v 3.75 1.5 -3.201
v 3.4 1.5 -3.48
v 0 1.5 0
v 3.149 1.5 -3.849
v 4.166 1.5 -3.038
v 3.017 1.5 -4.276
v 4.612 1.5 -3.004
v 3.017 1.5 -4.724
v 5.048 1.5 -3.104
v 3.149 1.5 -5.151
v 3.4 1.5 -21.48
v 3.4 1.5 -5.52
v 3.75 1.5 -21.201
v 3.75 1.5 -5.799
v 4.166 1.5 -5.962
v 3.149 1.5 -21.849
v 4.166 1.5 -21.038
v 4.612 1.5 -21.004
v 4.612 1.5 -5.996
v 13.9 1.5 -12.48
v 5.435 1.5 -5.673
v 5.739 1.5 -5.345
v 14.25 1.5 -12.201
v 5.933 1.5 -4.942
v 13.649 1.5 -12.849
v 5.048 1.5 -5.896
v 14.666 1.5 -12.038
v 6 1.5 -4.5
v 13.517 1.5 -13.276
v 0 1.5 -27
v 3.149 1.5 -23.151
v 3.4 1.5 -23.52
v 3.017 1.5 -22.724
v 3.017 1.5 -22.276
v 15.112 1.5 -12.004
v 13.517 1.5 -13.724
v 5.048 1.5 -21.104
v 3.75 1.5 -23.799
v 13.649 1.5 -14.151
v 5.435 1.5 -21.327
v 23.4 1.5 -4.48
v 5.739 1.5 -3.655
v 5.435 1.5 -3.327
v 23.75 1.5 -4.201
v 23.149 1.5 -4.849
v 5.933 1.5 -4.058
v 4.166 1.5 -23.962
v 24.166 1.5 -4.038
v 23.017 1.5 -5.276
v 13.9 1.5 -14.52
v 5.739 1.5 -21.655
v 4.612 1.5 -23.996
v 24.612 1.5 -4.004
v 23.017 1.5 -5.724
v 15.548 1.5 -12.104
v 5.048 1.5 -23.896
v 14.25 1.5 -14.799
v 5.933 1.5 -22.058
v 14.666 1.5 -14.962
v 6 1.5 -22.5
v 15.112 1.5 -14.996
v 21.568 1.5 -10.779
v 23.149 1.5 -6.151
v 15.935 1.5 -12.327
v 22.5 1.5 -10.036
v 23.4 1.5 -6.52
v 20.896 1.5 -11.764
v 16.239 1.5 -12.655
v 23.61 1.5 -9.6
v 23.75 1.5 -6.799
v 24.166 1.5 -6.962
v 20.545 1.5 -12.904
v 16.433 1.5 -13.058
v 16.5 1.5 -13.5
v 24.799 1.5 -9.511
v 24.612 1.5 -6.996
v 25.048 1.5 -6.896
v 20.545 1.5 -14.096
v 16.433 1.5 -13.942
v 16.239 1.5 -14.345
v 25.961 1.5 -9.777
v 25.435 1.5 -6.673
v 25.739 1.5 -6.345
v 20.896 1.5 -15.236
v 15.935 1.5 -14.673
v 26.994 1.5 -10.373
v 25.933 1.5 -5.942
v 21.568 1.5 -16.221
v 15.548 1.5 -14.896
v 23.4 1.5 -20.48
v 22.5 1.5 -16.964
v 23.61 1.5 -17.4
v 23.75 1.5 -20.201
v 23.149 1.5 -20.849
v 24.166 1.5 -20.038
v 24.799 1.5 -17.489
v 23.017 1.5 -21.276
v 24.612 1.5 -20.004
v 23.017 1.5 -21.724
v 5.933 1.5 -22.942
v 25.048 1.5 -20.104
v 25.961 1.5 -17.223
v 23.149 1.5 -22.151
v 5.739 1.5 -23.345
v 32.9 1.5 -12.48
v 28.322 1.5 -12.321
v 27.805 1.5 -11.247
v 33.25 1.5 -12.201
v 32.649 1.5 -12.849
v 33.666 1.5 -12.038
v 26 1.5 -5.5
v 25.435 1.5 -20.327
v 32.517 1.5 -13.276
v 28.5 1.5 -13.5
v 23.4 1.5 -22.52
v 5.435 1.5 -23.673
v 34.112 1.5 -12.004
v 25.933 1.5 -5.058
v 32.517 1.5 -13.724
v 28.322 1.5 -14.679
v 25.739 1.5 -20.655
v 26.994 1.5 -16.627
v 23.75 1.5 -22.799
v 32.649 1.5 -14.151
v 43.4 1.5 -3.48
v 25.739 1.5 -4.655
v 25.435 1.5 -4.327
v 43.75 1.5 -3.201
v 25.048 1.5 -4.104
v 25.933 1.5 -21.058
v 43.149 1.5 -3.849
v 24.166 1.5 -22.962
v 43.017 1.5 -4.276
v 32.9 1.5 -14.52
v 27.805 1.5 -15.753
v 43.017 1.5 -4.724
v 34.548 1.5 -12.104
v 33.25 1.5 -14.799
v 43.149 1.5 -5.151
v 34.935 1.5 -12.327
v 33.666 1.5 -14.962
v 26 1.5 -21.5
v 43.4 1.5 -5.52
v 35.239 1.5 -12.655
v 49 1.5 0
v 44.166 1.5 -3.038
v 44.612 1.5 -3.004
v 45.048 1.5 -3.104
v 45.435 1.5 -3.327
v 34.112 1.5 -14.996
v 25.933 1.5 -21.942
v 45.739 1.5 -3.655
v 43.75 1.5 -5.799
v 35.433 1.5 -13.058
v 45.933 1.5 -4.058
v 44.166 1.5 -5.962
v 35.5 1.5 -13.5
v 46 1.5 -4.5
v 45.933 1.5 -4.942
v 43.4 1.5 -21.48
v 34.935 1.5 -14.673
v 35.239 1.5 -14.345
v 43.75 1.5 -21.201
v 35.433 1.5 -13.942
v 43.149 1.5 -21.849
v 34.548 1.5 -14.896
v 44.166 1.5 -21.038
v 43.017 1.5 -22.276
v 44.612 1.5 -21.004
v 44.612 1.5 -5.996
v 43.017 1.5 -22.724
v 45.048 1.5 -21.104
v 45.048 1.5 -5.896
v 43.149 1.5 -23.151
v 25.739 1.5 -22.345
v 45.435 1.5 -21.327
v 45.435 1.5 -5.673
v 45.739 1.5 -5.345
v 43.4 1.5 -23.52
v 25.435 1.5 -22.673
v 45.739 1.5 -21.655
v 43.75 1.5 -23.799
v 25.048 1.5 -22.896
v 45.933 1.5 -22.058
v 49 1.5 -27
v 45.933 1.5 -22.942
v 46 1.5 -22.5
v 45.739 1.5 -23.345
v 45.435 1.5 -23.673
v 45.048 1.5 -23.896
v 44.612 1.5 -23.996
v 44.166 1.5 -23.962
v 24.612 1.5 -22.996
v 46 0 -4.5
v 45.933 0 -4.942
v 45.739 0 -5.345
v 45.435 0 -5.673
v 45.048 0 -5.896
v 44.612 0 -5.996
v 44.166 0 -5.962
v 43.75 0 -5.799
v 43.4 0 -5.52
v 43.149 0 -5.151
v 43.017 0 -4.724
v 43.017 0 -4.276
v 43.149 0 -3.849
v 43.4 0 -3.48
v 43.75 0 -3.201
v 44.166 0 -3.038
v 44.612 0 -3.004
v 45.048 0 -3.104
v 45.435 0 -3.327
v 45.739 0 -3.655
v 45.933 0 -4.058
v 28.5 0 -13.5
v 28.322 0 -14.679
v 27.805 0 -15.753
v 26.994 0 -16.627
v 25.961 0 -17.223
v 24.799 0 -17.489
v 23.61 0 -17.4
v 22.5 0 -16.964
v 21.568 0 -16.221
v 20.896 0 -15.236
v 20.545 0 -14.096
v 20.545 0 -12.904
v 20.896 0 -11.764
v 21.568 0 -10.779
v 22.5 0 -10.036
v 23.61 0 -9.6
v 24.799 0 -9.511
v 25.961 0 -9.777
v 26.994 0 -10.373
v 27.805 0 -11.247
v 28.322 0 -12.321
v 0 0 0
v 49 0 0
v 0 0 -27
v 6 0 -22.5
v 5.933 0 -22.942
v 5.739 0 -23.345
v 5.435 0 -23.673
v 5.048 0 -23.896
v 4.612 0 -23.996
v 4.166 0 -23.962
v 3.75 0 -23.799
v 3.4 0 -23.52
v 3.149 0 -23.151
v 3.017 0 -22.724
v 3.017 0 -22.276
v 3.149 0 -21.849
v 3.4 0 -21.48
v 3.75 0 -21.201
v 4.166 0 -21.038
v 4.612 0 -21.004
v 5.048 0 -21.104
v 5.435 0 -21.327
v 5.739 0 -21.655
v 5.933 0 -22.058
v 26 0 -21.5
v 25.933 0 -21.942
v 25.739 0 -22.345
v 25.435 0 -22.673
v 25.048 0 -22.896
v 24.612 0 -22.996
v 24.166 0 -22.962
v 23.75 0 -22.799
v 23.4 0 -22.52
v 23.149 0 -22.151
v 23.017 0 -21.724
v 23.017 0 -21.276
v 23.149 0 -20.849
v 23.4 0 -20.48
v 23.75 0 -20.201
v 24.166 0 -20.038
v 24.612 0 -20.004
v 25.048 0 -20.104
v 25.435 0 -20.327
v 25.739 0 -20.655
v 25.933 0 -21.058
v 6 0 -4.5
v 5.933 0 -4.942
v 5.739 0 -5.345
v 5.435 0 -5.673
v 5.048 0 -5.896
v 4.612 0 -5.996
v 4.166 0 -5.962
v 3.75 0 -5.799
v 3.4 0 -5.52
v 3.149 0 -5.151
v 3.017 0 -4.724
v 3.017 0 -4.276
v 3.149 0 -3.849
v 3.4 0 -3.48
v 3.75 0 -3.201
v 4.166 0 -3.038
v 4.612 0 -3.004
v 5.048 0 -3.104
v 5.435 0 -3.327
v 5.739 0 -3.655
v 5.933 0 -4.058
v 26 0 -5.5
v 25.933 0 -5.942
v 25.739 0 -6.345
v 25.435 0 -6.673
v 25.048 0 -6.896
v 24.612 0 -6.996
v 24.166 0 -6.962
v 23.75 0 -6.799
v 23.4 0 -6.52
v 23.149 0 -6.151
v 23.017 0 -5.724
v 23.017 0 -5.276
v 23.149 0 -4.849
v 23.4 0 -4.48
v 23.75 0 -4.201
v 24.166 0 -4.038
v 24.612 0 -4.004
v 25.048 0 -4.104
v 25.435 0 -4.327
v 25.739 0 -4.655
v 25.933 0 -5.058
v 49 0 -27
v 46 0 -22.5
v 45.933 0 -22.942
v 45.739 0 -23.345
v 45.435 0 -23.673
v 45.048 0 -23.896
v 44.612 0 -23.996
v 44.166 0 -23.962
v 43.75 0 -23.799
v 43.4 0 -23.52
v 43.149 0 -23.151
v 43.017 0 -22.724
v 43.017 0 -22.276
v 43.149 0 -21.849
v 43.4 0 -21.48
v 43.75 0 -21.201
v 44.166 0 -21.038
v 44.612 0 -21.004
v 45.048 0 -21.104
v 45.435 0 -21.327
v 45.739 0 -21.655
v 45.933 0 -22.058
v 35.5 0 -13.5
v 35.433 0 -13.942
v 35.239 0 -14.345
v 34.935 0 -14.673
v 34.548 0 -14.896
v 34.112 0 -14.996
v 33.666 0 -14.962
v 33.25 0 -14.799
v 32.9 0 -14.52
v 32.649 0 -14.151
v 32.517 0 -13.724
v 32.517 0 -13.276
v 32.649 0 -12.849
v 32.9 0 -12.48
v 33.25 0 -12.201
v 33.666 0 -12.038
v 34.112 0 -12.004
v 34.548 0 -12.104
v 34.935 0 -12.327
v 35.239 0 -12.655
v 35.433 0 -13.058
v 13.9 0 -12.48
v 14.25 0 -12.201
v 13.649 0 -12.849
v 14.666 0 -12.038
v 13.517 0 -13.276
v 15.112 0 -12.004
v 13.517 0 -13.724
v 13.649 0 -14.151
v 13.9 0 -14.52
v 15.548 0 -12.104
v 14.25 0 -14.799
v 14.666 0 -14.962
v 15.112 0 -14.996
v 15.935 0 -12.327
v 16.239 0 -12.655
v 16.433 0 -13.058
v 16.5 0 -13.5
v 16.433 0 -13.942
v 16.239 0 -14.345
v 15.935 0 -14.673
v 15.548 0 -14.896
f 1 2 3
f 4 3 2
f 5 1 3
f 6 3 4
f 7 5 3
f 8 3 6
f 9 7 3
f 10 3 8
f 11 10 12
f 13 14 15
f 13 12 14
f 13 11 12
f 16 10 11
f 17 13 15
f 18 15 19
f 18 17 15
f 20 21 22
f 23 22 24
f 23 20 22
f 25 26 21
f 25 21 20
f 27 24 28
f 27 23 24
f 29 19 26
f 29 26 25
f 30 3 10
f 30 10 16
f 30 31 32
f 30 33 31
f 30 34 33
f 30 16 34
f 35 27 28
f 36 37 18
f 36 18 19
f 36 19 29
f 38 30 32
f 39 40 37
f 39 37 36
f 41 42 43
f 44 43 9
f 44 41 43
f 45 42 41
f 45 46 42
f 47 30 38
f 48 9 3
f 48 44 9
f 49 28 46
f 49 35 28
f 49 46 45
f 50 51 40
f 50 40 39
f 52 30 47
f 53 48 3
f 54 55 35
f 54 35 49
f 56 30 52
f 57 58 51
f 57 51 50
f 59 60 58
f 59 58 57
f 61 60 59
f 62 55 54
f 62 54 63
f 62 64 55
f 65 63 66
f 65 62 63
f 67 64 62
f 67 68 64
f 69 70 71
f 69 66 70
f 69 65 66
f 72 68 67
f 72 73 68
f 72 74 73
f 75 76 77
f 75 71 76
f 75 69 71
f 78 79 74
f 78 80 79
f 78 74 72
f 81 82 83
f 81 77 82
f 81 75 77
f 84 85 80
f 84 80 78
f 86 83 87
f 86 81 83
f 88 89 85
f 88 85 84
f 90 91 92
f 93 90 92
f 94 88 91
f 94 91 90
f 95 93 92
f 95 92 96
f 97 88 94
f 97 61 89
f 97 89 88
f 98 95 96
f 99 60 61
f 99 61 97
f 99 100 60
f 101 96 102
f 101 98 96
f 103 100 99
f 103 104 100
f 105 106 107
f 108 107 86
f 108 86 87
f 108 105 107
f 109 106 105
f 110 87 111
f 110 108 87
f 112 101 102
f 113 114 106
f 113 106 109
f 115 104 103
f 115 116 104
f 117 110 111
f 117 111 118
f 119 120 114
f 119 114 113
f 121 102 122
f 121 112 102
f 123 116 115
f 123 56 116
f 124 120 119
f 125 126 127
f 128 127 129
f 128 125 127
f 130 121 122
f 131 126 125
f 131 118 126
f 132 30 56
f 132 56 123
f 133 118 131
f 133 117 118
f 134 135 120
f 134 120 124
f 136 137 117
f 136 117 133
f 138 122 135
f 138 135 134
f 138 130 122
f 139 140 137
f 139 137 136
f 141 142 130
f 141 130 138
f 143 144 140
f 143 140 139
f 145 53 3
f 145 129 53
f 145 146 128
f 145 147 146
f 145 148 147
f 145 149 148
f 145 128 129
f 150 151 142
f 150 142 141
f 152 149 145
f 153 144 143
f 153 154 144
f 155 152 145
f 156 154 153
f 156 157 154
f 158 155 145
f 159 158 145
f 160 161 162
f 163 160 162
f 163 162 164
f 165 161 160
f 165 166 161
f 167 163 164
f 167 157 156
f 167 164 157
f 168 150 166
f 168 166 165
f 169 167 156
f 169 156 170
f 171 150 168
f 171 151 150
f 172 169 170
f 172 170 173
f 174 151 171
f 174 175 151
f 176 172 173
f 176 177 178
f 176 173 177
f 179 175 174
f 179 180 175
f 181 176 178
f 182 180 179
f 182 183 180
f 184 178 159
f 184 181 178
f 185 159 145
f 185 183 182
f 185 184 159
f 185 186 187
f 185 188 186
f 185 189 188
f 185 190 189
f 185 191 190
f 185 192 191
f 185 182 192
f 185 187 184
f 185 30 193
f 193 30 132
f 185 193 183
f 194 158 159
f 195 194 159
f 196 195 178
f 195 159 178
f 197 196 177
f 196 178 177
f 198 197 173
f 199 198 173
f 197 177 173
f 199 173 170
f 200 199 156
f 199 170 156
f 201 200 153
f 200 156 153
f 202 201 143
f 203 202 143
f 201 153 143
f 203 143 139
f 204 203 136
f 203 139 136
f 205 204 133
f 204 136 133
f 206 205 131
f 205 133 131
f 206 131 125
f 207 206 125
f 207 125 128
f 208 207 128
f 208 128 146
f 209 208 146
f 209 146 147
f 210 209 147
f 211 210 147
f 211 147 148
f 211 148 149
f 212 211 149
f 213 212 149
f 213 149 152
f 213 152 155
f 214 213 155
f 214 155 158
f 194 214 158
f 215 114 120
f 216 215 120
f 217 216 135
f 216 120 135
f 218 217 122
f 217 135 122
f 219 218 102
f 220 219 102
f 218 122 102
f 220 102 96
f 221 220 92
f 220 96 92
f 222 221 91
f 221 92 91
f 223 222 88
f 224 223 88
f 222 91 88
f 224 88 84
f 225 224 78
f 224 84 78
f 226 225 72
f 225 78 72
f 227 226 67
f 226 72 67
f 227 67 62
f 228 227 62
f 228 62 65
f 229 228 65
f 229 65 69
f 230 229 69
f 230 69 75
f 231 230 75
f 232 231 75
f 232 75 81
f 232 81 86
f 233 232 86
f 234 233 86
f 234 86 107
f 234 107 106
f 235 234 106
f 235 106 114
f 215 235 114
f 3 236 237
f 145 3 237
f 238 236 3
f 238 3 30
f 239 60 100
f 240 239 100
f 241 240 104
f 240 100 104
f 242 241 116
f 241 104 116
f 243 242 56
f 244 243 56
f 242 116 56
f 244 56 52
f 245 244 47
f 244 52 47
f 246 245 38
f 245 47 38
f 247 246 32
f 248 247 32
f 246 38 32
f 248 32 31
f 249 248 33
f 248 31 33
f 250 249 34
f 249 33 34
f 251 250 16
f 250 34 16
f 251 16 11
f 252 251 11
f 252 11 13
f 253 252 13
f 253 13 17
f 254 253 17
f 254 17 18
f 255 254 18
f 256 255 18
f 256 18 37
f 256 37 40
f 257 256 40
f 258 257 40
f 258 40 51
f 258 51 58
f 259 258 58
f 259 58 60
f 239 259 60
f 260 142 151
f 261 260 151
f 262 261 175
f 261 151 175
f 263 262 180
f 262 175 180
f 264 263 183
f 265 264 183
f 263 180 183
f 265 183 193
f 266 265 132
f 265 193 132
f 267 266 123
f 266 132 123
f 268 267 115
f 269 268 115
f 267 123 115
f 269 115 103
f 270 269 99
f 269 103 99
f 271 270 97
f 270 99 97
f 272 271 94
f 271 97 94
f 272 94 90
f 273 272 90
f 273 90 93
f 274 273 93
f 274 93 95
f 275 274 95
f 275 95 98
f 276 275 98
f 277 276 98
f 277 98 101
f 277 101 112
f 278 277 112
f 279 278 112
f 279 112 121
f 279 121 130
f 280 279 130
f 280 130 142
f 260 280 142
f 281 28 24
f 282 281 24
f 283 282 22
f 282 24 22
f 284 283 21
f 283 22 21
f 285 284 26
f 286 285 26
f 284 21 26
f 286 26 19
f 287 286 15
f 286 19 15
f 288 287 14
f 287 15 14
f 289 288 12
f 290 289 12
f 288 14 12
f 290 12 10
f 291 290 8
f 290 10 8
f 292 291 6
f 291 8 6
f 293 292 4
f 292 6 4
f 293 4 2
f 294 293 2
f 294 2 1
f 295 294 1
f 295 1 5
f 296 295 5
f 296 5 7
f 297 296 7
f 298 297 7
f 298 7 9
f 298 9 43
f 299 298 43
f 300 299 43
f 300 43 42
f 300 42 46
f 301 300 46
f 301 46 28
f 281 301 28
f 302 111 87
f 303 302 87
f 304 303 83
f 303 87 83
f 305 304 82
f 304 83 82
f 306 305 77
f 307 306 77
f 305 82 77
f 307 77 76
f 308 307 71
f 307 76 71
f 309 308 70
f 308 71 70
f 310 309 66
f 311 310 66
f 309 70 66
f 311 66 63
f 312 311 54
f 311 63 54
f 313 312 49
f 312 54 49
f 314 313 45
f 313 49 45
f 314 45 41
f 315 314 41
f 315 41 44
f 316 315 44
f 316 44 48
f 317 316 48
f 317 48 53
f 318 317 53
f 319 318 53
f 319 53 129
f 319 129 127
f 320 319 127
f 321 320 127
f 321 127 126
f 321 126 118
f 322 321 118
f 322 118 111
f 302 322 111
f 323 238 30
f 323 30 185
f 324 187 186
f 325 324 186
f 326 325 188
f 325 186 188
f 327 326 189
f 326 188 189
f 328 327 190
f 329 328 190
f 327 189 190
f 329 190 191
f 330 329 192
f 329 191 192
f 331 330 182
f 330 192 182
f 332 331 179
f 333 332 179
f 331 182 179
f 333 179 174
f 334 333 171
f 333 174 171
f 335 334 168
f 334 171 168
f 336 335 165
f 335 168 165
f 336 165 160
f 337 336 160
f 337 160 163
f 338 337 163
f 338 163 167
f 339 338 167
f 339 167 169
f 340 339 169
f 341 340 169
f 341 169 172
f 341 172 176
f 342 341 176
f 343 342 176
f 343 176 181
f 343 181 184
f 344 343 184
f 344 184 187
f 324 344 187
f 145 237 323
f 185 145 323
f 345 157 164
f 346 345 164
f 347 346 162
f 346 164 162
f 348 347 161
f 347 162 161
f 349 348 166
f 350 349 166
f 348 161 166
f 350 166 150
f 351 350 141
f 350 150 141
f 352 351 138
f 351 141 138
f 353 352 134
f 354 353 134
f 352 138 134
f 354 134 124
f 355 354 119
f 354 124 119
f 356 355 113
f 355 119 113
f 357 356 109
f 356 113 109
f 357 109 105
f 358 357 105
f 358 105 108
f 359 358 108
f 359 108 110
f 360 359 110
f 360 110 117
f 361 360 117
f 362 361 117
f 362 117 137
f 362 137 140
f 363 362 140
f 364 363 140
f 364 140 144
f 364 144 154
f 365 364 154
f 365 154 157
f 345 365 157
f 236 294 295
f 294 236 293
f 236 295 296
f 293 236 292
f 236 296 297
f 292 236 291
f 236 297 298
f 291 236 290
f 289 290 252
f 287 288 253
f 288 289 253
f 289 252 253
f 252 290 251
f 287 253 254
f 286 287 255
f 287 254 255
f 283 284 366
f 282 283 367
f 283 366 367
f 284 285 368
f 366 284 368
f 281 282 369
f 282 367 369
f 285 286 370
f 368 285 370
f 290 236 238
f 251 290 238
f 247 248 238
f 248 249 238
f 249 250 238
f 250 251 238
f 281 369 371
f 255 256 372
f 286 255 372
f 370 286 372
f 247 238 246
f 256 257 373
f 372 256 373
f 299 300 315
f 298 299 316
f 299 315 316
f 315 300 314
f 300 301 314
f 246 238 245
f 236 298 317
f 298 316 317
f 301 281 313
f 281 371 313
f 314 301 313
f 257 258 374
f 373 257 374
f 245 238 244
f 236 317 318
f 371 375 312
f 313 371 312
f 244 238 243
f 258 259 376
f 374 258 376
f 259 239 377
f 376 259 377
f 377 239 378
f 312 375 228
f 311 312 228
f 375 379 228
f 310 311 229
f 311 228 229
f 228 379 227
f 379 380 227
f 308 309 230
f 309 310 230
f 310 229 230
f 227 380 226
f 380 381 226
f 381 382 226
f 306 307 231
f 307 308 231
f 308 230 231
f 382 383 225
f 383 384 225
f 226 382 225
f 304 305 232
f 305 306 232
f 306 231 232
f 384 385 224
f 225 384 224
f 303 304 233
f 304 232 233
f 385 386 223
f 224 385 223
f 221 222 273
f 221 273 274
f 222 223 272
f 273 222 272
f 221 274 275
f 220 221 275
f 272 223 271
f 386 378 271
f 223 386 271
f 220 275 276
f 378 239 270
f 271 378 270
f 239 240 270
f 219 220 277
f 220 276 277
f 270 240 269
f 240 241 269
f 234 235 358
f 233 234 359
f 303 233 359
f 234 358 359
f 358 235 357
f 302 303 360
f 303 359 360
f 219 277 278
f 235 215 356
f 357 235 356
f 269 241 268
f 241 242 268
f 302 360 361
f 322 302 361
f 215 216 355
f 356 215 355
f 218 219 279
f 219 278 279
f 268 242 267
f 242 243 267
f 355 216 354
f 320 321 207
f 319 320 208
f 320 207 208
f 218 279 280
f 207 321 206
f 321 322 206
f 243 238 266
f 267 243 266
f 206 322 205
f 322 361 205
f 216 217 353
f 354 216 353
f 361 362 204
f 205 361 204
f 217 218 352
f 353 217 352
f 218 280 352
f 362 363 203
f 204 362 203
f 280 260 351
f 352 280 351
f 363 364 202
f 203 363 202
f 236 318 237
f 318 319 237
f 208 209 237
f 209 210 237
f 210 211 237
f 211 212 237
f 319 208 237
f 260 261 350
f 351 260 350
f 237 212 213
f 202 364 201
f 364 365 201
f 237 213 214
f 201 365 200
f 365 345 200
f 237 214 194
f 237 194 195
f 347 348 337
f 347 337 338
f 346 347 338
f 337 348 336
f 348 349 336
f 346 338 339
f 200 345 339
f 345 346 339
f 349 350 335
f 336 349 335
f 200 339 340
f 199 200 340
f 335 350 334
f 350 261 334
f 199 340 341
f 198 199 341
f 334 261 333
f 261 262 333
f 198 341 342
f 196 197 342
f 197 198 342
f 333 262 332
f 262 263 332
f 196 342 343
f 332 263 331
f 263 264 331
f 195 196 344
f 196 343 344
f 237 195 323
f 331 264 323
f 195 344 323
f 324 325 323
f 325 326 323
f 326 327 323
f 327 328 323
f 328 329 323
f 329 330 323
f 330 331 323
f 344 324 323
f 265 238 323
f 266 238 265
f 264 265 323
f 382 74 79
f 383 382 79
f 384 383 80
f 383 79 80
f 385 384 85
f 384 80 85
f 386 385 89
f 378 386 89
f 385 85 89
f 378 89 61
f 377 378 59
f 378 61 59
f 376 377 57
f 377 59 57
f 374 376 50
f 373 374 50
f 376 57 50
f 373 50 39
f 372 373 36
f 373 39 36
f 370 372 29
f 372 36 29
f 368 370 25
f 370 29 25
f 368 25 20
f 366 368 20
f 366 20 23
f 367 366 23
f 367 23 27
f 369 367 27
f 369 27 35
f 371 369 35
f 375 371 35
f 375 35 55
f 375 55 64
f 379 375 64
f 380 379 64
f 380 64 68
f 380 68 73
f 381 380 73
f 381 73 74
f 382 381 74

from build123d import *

# Parameters (mm, degrees)
SKETCH1_W               = 49
SKETCH1_H               = 27
BOSS_EXTRUDE1_DEPTH     = 1.5
CUT_EXTRUDE1_DEPTH      = 10
CUT_EXTRUDE1_DEPTH_BACK = 10
SKETCH2_R               = 1.5
CUT_EXTRUDE2_DEPTH      = 10
CUT_EXTRUDE2_DEPTH_BACK = 10
SKETCH3_R               = 1.5
SKETCH3_R_2             = 4


with BuildPart() as part:
    # Sketch1 → Boss-Extrude1 (new body)
    with BuildSketch(Plane(origin=(0, 0, 0), x_dir=(1, 0, 0), z_dir=(0, 1, 0))):
        with Locations((24.5, 13.5)):
            Rectangle(SKETCH1_W, SKETCH1_H)
    extrude(amount=BOSS_EXTRUDE1_DEPTH)

    # Sketch2 → Cut-Extrude1 (cut, two sides: drawn at the far end of the back side and taken through both)
    with BuildSketch(Plane(origin=(0, 1.5, 0), x_dir=(1, 0, 0), z_dir=(0, 1, 0)).offset(-CUT_EXTRUDE1_DEPTH_BACK)):
        with Locations((4.5, 22.5)):
            Circle(SKETCH2_R)
        with Locations((4.5, 4.5)):
            Circle(SKETCH2_R)
        with Locations((44.5, 4.5)):
            Circle(SKETCH2_R)
        with Locations((44.5, 22.5)):
            Circle(SKETCH2_R)
    extrude(amount=CUT_EXTRUDE1_DEPTH + CUT_EXTRUDE1_DEPTH_BACK, mode=Mode.SUBTRACT)

    # Sketch3 → Cut-Extrude2 (cut, two sides: drawn at the far end of the back side and taken through both)
    with BuildSketch(Plane(origin=(0, 1.5, 0), x_dir=(1, 0, 0), z_dir=(0, 1, 0)).offset(-CUT_EXTRUDE2_DEPTH_BACK)):
        with Locations((15, 13.5)):
            Circle(SKETCH3_R)
        with Locations((34, 13.5)):
            Circle(SKETCH3_R)
        with Locations((24.5, 21.5)):
            Circle(SKETCH3_R)
        with Locations((24.5, 5.5)):
            Circle(SKETCH3_R)
        with Locations((24.5, 13.5)):
            Circle(SKETCH3_R_2)
    extrude(amount=CUT_EXTRUDE2_DEPTH + CUT_EXTRUDE2_DEPTH_BACK, mode=Mode.SUBTRACT)


solid = part.part
